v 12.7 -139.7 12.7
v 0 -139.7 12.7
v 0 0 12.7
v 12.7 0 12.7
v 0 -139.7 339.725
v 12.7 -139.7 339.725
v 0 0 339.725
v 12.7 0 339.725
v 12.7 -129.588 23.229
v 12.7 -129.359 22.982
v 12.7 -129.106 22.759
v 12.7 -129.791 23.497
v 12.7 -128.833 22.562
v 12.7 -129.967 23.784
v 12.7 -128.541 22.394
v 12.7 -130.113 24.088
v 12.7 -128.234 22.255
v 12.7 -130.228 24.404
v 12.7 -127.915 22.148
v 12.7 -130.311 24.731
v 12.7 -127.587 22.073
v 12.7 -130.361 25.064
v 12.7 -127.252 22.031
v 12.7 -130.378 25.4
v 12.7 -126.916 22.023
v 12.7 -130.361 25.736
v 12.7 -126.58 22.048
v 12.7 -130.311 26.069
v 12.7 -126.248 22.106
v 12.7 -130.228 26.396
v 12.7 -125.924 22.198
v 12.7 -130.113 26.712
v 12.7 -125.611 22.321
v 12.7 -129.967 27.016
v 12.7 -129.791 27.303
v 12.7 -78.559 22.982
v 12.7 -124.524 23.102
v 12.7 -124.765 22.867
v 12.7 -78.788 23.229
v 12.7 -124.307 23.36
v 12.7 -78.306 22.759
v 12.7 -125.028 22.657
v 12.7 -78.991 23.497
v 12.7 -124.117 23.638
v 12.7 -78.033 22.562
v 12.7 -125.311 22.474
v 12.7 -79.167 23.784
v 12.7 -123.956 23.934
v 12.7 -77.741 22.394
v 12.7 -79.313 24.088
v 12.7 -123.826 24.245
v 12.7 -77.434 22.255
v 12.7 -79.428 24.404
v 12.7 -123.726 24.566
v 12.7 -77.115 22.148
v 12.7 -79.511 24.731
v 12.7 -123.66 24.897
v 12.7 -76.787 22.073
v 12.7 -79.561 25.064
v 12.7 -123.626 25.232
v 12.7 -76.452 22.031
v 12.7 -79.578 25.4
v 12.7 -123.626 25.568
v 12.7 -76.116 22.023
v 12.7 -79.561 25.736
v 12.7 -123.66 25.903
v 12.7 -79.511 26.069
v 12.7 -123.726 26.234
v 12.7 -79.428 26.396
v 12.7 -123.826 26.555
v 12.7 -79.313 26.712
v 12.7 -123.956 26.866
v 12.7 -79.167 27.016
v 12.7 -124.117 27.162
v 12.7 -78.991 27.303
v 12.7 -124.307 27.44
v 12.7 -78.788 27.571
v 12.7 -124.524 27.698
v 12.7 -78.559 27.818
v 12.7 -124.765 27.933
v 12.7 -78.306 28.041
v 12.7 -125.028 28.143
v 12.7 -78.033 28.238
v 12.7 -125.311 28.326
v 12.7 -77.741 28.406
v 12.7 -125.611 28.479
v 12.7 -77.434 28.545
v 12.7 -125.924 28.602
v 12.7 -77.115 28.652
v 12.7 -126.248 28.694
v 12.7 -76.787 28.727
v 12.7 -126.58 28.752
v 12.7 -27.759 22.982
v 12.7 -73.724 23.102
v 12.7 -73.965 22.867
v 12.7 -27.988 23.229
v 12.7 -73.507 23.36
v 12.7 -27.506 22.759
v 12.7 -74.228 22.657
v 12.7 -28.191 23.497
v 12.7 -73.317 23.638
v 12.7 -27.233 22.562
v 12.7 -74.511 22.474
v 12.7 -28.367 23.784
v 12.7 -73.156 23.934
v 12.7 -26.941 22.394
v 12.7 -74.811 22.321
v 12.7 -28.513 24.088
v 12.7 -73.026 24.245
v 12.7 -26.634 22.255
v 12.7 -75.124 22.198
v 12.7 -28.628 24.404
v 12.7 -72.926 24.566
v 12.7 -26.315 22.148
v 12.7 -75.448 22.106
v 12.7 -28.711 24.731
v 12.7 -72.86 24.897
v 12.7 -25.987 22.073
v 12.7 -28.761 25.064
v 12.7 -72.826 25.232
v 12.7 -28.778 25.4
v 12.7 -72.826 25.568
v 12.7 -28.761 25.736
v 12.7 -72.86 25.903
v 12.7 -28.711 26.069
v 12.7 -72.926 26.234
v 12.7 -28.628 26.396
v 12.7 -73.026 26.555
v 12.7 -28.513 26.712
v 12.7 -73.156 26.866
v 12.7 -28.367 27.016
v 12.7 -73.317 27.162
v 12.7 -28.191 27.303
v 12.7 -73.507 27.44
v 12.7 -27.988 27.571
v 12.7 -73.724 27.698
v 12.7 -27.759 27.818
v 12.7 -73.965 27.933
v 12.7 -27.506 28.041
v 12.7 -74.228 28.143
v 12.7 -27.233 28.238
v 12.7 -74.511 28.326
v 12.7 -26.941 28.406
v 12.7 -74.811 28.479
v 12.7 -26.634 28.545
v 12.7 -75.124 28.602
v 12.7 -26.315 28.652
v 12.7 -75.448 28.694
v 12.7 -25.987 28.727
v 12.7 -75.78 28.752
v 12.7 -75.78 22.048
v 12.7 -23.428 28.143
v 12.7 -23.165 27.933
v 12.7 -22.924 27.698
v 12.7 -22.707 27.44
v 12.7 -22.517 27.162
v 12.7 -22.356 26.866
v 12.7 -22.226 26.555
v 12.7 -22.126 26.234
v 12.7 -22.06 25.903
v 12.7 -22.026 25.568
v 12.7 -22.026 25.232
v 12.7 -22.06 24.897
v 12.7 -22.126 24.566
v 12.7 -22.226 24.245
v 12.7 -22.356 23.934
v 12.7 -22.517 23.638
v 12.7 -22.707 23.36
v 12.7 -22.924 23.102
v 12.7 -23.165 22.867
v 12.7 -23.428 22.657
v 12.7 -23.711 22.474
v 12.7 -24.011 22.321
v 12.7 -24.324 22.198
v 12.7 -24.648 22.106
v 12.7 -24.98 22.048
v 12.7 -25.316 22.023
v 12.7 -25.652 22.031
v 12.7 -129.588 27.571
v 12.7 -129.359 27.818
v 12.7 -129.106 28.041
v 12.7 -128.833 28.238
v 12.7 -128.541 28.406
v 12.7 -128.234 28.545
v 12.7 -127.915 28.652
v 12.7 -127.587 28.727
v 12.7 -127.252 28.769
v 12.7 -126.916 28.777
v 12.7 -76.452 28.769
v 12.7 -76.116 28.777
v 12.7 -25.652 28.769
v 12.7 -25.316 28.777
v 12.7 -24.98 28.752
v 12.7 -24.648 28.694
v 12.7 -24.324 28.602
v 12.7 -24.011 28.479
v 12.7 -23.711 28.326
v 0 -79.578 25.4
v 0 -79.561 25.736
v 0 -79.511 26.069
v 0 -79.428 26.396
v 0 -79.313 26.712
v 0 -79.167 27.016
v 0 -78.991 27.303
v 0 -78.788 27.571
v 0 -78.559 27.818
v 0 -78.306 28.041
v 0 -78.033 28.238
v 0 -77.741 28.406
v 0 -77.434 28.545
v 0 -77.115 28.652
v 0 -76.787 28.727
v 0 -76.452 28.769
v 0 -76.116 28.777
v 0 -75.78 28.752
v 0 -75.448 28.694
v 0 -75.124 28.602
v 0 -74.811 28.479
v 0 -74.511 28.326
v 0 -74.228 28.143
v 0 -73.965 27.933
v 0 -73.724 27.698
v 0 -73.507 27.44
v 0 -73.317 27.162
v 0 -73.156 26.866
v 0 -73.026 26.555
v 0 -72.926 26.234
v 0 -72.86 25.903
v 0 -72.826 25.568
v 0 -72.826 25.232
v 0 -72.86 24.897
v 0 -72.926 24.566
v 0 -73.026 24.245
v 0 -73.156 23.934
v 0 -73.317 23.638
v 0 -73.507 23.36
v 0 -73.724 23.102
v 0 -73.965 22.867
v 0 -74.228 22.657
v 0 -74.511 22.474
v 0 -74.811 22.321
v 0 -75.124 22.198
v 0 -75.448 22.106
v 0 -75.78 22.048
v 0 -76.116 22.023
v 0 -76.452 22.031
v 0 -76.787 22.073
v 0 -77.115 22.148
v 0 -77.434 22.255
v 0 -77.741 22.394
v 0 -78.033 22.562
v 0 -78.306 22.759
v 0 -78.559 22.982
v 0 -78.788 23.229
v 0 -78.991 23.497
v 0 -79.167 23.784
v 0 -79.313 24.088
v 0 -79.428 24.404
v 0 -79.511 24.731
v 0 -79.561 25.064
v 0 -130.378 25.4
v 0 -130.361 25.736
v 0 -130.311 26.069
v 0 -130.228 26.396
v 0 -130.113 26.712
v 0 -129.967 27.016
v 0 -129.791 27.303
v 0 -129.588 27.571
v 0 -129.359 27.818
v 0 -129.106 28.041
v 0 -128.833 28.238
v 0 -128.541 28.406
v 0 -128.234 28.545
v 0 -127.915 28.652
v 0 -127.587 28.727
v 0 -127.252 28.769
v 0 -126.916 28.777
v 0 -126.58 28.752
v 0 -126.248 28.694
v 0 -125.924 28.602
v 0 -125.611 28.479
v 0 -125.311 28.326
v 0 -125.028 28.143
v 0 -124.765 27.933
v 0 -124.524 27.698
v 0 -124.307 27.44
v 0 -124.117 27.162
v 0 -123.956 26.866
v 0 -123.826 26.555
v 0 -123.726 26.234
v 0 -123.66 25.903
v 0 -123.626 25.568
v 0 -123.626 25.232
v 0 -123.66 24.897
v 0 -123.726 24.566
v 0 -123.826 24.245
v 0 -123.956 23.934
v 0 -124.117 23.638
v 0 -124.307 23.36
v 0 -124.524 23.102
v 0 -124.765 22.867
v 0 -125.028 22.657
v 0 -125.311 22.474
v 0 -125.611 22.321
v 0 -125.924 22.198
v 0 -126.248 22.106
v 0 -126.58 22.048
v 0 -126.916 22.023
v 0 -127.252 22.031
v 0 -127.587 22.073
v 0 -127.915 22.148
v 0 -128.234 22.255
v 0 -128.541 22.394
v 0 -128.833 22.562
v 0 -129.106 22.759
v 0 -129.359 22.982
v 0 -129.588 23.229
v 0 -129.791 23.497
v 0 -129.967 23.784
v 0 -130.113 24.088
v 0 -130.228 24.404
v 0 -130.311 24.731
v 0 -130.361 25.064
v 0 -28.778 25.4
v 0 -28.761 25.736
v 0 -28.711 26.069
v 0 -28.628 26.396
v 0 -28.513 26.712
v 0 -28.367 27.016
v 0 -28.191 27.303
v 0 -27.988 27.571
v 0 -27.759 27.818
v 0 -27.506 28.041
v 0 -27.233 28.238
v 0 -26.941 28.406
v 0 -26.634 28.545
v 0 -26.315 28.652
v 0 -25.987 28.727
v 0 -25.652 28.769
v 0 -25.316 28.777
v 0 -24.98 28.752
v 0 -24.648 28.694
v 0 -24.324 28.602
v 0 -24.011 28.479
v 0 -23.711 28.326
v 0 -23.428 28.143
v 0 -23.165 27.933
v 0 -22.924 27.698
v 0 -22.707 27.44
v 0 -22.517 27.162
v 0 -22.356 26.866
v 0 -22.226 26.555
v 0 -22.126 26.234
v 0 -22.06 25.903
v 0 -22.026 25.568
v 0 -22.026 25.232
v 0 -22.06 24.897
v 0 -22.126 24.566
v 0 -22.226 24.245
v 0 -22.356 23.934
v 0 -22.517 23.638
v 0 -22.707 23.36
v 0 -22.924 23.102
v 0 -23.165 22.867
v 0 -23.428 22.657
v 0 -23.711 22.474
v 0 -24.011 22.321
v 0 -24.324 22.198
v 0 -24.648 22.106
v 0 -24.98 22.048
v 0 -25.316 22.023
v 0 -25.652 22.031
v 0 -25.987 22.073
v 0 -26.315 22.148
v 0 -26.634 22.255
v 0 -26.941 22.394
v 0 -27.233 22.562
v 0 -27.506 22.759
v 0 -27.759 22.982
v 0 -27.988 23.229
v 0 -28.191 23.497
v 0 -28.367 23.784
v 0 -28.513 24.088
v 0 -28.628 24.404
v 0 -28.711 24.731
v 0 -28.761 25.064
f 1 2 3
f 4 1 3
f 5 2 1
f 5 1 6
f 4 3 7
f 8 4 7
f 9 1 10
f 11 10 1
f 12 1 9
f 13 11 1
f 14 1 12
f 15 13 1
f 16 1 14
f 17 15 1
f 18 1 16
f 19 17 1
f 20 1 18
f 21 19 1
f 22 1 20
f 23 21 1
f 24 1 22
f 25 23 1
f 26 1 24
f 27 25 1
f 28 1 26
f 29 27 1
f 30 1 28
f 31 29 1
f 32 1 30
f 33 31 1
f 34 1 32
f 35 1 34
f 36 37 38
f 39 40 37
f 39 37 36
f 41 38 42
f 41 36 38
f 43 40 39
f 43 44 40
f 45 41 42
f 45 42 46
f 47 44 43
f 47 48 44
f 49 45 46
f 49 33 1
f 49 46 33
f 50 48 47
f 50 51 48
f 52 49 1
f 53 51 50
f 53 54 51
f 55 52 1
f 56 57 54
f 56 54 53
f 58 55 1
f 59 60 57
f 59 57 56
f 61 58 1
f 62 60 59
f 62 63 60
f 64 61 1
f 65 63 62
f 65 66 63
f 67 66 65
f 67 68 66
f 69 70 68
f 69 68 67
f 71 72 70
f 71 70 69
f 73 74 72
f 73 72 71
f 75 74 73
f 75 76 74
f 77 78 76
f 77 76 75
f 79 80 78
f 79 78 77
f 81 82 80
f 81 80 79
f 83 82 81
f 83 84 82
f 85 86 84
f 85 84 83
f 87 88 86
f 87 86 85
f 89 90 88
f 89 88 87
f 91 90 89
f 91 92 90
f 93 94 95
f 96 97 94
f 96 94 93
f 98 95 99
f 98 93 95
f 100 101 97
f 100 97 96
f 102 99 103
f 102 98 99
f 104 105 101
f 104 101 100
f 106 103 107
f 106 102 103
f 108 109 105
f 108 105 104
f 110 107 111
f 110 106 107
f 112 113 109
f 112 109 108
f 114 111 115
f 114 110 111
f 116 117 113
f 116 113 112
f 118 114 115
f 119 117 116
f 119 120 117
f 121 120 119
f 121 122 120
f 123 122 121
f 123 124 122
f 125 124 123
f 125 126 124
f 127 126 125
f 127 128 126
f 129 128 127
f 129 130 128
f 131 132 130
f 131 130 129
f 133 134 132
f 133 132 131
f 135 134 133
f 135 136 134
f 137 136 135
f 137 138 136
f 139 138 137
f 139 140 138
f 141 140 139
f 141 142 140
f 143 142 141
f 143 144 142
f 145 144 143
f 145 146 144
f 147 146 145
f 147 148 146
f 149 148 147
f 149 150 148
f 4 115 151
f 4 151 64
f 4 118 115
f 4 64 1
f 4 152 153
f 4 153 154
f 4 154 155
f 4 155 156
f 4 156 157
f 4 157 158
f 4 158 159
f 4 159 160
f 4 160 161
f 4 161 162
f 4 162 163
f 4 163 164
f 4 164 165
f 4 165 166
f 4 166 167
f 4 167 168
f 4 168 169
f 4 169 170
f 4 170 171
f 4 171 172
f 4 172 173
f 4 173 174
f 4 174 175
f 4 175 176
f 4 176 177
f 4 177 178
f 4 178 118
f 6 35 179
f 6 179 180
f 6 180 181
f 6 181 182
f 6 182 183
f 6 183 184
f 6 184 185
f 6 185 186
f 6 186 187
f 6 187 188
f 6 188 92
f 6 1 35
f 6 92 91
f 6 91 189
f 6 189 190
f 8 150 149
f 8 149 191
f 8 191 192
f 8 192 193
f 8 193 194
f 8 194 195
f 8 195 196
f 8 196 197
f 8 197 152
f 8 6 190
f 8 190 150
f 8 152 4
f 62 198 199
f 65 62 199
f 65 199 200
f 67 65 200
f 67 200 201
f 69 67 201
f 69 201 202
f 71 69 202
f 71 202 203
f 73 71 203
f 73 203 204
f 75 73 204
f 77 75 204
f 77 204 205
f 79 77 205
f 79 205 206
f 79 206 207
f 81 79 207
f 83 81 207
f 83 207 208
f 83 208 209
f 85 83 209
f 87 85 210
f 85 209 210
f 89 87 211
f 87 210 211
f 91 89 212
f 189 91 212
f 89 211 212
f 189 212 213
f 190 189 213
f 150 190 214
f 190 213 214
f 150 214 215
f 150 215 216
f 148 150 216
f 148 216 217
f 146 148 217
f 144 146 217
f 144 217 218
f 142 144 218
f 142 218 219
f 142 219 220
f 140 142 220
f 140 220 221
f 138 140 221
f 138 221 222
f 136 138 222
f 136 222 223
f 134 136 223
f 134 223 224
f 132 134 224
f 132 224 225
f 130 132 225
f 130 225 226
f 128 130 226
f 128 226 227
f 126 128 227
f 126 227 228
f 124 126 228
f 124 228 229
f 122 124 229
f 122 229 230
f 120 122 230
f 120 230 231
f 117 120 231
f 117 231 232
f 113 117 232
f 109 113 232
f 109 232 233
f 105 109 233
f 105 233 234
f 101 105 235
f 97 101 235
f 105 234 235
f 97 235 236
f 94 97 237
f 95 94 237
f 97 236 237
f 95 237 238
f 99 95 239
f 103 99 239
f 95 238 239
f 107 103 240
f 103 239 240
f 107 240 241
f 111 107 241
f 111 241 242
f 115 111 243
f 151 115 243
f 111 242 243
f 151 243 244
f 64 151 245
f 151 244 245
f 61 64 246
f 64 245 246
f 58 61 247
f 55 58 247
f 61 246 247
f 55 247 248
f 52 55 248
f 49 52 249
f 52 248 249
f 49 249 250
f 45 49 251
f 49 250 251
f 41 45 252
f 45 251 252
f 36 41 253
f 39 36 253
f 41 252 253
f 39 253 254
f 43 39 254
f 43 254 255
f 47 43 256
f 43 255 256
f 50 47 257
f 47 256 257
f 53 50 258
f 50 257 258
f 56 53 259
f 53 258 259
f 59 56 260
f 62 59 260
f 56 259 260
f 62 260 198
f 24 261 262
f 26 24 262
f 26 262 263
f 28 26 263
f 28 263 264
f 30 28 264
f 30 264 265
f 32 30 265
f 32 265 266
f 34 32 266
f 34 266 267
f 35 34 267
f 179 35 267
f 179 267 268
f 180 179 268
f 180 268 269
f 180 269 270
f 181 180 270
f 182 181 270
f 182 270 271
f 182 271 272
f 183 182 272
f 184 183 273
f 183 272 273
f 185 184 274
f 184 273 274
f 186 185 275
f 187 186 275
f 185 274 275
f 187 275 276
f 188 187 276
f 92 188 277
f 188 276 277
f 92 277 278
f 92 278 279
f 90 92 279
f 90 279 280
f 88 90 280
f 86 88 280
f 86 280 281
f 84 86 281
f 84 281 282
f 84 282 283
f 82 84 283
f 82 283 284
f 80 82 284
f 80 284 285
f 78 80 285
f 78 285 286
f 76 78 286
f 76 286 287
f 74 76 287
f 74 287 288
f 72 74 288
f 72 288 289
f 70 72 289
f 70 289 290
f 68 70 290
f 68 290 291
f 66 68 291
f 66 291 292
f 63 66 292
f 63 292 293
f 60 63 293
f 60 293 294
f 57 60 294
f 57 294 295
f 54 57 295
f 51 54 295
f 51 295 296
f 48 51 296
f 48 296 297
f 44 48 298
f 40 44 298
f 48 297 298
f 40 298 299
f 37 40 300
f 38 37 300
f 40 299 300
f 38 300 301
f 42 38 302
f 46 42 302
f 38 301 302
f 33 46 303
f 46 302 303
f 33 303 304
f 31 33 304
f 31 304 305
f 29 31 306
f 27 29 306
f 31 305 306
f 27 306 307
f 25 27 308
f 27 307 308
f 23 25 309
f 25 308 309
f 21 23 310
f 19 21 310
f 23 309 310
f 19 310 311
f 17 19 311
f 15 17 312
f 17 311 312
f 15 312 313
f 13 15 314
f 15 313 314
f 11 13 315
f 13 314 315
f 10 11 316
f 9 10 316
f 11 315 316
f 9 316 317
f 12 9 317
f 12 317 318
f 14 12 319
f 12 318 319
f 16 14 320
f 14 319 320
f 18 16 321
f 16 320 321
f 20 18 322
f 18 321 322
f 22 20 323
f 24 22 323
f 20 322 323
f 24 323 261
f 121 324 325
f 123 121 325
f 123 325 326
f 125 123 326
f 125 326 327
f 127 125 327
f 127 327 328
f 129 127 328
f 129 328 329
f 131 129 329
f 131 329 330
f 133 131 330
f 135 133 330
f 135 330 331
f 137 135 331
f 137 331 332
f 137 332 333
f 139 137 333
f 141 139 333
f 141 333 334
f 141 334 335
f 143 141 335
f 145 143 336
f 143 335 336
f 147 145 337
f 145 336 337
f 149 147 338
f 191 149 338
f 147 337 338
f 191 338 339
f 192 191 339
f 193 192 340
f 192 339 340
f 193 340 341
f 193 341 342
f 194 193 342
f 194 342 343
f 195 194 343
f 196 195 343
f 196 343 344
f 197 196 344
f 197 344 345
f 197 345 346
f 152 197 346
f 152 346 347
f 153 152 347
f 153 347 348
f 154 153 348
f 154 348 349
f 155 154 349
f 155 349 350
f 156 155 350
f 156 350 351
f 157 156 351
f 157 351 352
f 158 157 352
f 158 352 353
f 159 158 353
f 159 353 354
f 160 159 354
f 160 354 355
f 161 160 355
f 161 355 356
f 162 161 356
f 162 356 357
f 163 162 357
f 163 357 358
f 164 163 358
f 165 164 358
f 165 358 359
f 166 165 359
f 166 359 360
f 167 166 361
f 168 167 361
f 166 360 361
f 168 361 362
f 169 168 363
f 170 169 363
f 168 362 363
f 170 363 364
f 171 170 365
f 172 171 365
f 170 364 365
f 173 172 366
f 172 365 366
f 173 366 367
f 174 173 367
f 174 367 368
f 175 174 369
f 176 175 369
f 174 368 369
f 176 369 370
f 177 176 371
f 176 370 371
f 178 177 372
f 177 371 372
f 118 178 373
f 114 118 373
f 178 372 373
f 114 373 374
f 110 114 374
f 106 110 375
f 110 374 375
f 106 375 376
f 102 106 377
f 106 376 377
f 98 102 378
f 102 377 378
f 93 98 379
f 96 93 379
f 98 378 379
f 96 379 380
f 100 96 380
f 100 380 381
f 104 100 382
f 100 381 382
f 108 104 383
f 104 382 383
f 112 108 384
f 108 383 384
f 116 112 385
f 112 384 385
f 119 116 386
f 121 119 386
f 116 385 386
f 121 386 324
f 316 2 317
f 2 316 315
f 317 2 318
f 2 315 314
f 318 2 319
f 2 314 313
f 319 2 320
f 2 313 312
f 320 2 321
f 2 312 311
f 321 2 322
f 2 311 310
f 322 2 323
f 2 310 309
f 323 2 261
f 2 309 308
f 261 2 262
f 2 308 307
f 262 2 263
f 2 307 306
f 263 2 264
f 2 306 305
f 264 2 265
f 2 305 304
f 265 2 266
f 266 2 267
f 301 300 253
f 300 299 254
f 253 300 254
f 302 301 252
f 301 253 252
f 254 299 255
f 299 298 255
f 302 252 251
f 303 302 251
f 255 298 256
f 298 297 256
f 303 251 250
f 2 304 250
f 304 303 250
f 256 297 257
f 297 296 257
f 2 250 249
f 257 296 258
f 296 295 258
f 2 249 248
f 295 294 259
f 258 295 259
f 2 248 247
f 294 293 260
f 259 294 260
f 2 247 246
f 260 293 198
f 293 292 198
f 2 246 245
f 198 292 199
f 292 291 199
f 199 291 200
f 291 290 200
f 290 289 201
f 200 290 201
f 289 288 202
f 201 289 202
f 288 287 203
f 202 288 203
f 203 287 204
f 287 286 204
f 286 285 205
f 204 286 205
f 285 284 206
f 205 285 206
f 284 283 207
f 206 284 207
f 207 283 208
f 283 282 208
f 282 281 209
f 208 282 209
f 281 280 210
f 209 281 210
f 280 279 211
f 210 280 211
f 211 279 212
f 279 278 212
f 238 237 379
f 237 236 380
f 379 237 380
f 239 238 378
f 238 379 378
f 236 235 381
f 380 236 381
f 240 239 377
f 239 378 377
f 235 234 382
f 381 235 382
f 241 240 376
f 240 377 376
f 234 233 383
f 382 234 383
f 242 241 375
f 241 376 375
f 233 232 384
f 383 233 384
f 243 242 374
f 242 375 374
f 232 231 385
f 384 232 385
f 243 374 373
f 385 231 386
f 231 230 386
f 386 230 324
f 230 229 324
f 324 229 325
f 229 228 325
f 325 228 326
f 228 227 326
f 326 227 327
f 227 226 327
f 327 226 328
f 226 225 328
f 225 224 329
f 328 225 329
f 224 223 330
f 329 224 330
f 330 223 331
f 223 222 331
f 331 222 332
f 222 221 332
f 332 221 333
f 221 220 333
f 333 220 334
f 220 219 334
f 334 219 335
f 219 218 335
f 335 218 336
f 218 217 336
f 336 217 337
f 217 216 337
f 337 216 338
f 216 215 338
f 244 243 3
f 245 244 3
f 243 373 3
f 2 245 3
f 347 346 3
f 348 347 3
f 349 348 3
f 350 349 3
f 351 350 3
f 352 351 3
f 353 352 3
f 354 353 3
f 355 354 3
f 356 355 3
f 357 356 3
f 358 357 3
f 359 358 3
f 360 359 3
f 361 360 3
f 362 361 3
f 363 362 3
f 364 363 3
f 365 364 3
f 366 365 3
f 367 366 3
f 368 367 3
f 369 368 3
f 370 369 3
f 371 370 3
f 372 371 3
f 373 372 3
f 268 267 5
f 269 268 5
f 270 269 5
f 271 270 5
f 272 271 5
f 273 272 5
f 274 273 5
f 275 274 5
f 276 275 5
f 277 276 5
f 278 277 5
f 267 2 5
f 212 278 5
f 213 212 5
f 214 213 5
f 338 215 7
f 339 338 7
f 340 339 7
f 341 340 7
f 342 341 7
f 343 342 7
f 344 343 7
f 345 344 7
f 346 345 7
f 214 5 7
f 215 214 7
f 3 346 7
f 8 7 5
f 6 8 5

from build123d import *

# Parameters (mm, degrees)
F0_W     = 127
F0_H     = 327.025
F0_W_2   = 12.7
F1_DEPTH = 12.7
F3_D     = 6.7564


with BuildPart() as f1:
    # F0 (on Right) → F1 (new body)
    with BuildSketch(Plane.YZ):
        with Locations((-76.2, 176.2125)):
            Rectangle(F0_W, F0_H)
        with Locations((-6.35, 176.2125)):
            Rectangle(F0_W_2, F0_H)
    extrude(amount=F1_DEPTH)

    # F3 (through all)
    with Locations(Plane.YZ.offset(12.7)):
        with Locations((-127, 25.4), (-76.2, 25.4), (-25.4, 25.4)):
            Hole(F3_D / 2)


solid = f1.part
